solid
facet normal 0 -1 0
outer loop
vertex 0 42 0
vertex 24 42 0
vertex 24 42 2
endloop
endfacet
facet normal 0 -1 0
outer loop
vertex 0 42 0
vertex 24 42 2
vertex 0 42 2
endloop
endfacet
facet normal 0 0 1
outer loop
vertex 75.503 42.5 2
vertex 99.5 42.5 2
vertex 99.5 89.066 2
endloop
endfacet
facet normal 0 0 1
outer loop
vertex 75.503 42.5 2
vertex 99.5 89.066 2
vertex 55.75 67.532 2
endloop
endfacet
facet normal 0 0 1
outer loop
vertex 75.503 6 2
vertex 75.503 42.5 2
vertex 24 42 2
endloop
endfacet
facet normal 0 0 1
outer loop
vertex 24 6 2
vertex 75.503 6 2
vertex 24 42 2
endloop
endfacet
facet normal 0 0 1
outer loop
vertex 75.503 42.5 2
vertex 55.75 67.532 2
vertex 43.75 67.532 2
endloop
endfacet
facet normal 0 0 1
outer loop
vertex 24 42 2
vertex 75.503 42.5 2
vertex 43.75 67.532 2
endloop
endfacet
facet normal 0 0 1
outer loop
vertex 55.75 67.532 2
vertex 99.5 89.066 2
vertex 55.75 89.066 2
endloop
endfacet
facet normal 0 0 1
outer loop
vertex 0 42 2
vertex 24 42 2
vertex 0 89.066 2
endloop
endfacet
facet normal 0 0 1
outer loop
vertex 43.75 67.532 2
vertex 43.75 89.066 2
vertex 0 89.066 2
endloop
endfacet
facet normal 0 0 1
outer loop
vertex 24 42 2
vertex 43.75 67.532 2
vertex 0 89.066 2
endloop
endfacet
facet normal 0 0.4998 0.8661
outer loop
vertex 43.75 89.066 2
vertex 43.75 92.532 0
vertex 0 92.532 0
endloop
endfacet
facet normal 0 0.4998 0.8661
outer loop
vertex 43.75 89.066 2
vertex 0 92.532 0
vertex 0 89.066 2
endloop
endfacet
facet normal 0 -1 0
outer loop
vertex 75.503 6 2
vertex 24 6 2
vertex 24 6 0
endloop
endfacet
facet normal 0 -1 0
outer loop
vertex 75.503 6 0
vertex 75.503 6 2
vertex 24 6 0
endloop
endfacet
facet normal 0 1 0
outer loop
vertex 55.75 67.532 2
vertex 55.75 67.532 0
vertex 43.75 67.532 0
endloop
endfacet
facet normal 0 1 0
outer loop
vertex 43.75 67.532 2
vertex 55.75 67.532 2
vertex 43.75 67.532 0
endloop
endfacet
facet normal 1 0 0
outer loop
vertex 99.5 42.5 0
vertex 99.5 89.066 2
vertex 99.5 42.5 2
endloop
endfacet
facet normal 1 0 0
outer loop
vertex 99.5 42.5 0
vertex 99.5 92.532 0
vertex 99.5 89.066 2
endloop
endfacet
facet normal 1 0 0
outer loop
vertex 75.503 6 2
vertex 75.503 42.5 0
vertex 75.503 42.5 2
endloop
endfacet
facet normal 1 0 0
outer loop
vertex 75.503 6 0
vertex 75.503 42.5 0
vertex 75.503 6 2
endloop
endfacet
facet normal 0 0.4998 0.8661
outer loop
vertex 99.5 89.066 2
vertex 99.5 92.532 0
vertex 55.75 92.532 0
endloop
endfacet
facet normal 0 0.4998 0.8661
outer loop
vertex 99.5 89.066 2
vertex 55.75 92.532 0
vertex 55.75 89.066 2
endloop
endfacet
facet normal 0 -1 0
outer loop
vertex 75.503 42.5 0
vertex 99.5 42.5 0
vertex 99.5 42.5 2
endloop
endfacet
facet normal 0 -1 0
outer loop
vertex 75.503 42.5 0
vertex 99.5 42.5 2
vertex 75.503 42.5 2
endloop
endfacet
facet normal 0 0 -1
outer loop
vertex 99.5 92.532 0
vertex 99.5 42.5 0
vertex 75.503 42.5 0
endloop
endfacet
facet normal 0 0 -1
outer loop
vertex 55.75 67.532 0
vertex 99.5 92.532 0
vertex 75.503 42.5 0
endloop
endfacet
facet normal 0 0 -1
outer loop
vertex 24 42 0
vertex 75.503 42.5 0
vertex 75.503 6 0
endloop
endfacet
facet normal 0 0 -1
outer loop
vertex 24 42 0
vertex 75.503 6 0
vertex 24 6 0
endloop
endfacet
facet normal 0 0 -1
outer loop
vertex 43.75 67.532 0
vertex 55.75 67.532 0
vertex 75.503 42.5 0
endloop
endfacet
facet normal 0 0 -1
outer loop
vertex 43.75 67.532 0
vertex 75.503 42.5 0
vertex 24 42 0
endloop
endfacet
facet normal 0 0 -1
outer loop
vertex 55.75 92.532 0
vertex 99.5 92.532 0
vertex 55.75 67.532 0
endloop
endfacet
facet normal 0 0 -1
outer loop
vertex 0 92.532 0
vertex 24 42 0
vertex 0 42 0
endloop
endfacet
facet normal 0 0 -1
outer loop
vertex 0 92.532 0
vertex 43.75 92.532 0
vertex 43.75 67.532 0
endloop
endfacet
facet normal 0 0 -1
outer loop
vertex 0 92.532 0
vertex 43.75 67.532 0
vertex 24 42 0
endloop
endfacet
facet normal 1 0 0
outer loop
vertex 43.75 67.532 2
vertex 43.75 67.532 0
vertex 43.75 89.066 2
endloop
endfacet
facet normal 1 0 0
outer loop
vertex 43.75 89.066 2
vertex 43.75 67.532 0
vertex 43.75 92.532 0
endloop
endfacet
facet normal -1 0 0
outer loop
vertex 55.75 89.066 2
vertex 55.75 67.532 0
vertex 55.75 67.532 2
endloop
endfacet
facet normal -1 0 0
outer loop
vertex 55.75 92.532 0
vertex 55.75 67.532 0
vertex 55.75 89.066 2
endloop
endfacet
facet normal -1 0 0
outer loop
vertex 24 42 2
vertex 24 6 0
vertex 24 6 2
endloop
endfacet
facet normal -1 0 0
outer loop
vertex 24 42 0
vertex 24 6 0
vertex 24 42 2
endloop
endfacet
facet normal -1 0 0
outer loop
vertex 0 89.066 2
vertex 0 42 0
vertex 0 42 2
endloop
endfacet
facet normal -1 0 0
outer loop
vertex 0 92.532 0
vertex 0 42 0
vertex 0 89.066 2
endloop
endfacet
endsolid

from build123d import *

# Parameters (mm, degrees)
SALIENTE_EXTRUIR1_DEPTH = 2
CORTAR_EXTRUIR2_START   = -100
CORTAR_EXTRUIR2_DEPTH   = 100
CORTAR_EXTRUIR3_DEPTH   = 2
CROQUIS7_W              = 12
CROQUIS7_H              = 25
CORTAR_EXTRUIR4_DEPTH   = 2
CORTAR_EXTRUIR5_START   = -51.502837
CROQUIS9_W              = 2
CROQUIS9_H              = 6
CORTAR_EXTRUIR5_DEPTH   = 51.502837


with BuildPart() as part:
    # Croquis1 → Saliente-Extruir1 (new body)
    with BuildSketch(Plane.XY):
        Polygon((100, 100), (100, 42), (76, 42), (76, 0), (24, 0), (24, 42), (0, 42), (0, 100), align=None)
    extrude(amount=SALIENTE_EXTRUIR1_DEPTH)

    # Croquis4 → Cortar-Extruir2 (cut)
    with BuildSketch(Plane.ZY.offset(CORTAR_EXTRUIR2_START)):
        Polygon((2, 89.065555864), (2, 91.065555864), (2, 93.066666667), (2, 100), (0, 100), (0, 96.533333333), (0, 94.532222531), (0, 92.532222531), align=None)
    extrude(amount=CORTAR_EXTRUIR2_DEPTH, mode=Mode.SUBTRACT)

    # Croquis6 → Cortar-Extruir3 (cut)
    with BuildSketch(Plane(origin=(0, 0, 0), x_dir=(-1, 0, 0), z_dir=(0, 0, -1))):
        Polygon((-100, 92.532222531), (-99.5, 92.532222531), (-99.5, 42.5), (-75.502836605, 42.5), (-75.502836605, 0), (-76, 0), (-76, 42), (-100, 42), align=None)
    extrude(amount=-CORTAR_EXTRUIR3_DEPTH, mode=Mode.SUBTRACT)

    # Croquis7 → Cortar-Extruir4 (cut)
    with BuildSketch(Plane(origin=(0, 0, 0), x_dir=(-1, 0, 0), z_dir=(0, 0, -1))):
        with Locations((-49.75, 80.032222531)):
            Rectangle(CROQUIS7_W, CROQUIS7_H)
    extrude(amount=-CORTAR_EXTRUIR4_DEPTH, mode=Mode.SUBTRACT)

    # Croquis9 → Cortar-Extruir5 (cut)
    with BuildSketch(Plane(origin=(75.502836605, 0, 0), x_dir=(0, 0, -1), z_dir=(1, 0, 0)).offset(CORTAR_EXTRUIR5_START)):
        with Locations((-1, 3)):
            Rectangle(CROQUIS9_W, CROQUIS9_H)
    extrude(amount=CORTAR_EXTRUIR5_DEPTH, mode=Mode.SUBTRACT)


solid = part.part
